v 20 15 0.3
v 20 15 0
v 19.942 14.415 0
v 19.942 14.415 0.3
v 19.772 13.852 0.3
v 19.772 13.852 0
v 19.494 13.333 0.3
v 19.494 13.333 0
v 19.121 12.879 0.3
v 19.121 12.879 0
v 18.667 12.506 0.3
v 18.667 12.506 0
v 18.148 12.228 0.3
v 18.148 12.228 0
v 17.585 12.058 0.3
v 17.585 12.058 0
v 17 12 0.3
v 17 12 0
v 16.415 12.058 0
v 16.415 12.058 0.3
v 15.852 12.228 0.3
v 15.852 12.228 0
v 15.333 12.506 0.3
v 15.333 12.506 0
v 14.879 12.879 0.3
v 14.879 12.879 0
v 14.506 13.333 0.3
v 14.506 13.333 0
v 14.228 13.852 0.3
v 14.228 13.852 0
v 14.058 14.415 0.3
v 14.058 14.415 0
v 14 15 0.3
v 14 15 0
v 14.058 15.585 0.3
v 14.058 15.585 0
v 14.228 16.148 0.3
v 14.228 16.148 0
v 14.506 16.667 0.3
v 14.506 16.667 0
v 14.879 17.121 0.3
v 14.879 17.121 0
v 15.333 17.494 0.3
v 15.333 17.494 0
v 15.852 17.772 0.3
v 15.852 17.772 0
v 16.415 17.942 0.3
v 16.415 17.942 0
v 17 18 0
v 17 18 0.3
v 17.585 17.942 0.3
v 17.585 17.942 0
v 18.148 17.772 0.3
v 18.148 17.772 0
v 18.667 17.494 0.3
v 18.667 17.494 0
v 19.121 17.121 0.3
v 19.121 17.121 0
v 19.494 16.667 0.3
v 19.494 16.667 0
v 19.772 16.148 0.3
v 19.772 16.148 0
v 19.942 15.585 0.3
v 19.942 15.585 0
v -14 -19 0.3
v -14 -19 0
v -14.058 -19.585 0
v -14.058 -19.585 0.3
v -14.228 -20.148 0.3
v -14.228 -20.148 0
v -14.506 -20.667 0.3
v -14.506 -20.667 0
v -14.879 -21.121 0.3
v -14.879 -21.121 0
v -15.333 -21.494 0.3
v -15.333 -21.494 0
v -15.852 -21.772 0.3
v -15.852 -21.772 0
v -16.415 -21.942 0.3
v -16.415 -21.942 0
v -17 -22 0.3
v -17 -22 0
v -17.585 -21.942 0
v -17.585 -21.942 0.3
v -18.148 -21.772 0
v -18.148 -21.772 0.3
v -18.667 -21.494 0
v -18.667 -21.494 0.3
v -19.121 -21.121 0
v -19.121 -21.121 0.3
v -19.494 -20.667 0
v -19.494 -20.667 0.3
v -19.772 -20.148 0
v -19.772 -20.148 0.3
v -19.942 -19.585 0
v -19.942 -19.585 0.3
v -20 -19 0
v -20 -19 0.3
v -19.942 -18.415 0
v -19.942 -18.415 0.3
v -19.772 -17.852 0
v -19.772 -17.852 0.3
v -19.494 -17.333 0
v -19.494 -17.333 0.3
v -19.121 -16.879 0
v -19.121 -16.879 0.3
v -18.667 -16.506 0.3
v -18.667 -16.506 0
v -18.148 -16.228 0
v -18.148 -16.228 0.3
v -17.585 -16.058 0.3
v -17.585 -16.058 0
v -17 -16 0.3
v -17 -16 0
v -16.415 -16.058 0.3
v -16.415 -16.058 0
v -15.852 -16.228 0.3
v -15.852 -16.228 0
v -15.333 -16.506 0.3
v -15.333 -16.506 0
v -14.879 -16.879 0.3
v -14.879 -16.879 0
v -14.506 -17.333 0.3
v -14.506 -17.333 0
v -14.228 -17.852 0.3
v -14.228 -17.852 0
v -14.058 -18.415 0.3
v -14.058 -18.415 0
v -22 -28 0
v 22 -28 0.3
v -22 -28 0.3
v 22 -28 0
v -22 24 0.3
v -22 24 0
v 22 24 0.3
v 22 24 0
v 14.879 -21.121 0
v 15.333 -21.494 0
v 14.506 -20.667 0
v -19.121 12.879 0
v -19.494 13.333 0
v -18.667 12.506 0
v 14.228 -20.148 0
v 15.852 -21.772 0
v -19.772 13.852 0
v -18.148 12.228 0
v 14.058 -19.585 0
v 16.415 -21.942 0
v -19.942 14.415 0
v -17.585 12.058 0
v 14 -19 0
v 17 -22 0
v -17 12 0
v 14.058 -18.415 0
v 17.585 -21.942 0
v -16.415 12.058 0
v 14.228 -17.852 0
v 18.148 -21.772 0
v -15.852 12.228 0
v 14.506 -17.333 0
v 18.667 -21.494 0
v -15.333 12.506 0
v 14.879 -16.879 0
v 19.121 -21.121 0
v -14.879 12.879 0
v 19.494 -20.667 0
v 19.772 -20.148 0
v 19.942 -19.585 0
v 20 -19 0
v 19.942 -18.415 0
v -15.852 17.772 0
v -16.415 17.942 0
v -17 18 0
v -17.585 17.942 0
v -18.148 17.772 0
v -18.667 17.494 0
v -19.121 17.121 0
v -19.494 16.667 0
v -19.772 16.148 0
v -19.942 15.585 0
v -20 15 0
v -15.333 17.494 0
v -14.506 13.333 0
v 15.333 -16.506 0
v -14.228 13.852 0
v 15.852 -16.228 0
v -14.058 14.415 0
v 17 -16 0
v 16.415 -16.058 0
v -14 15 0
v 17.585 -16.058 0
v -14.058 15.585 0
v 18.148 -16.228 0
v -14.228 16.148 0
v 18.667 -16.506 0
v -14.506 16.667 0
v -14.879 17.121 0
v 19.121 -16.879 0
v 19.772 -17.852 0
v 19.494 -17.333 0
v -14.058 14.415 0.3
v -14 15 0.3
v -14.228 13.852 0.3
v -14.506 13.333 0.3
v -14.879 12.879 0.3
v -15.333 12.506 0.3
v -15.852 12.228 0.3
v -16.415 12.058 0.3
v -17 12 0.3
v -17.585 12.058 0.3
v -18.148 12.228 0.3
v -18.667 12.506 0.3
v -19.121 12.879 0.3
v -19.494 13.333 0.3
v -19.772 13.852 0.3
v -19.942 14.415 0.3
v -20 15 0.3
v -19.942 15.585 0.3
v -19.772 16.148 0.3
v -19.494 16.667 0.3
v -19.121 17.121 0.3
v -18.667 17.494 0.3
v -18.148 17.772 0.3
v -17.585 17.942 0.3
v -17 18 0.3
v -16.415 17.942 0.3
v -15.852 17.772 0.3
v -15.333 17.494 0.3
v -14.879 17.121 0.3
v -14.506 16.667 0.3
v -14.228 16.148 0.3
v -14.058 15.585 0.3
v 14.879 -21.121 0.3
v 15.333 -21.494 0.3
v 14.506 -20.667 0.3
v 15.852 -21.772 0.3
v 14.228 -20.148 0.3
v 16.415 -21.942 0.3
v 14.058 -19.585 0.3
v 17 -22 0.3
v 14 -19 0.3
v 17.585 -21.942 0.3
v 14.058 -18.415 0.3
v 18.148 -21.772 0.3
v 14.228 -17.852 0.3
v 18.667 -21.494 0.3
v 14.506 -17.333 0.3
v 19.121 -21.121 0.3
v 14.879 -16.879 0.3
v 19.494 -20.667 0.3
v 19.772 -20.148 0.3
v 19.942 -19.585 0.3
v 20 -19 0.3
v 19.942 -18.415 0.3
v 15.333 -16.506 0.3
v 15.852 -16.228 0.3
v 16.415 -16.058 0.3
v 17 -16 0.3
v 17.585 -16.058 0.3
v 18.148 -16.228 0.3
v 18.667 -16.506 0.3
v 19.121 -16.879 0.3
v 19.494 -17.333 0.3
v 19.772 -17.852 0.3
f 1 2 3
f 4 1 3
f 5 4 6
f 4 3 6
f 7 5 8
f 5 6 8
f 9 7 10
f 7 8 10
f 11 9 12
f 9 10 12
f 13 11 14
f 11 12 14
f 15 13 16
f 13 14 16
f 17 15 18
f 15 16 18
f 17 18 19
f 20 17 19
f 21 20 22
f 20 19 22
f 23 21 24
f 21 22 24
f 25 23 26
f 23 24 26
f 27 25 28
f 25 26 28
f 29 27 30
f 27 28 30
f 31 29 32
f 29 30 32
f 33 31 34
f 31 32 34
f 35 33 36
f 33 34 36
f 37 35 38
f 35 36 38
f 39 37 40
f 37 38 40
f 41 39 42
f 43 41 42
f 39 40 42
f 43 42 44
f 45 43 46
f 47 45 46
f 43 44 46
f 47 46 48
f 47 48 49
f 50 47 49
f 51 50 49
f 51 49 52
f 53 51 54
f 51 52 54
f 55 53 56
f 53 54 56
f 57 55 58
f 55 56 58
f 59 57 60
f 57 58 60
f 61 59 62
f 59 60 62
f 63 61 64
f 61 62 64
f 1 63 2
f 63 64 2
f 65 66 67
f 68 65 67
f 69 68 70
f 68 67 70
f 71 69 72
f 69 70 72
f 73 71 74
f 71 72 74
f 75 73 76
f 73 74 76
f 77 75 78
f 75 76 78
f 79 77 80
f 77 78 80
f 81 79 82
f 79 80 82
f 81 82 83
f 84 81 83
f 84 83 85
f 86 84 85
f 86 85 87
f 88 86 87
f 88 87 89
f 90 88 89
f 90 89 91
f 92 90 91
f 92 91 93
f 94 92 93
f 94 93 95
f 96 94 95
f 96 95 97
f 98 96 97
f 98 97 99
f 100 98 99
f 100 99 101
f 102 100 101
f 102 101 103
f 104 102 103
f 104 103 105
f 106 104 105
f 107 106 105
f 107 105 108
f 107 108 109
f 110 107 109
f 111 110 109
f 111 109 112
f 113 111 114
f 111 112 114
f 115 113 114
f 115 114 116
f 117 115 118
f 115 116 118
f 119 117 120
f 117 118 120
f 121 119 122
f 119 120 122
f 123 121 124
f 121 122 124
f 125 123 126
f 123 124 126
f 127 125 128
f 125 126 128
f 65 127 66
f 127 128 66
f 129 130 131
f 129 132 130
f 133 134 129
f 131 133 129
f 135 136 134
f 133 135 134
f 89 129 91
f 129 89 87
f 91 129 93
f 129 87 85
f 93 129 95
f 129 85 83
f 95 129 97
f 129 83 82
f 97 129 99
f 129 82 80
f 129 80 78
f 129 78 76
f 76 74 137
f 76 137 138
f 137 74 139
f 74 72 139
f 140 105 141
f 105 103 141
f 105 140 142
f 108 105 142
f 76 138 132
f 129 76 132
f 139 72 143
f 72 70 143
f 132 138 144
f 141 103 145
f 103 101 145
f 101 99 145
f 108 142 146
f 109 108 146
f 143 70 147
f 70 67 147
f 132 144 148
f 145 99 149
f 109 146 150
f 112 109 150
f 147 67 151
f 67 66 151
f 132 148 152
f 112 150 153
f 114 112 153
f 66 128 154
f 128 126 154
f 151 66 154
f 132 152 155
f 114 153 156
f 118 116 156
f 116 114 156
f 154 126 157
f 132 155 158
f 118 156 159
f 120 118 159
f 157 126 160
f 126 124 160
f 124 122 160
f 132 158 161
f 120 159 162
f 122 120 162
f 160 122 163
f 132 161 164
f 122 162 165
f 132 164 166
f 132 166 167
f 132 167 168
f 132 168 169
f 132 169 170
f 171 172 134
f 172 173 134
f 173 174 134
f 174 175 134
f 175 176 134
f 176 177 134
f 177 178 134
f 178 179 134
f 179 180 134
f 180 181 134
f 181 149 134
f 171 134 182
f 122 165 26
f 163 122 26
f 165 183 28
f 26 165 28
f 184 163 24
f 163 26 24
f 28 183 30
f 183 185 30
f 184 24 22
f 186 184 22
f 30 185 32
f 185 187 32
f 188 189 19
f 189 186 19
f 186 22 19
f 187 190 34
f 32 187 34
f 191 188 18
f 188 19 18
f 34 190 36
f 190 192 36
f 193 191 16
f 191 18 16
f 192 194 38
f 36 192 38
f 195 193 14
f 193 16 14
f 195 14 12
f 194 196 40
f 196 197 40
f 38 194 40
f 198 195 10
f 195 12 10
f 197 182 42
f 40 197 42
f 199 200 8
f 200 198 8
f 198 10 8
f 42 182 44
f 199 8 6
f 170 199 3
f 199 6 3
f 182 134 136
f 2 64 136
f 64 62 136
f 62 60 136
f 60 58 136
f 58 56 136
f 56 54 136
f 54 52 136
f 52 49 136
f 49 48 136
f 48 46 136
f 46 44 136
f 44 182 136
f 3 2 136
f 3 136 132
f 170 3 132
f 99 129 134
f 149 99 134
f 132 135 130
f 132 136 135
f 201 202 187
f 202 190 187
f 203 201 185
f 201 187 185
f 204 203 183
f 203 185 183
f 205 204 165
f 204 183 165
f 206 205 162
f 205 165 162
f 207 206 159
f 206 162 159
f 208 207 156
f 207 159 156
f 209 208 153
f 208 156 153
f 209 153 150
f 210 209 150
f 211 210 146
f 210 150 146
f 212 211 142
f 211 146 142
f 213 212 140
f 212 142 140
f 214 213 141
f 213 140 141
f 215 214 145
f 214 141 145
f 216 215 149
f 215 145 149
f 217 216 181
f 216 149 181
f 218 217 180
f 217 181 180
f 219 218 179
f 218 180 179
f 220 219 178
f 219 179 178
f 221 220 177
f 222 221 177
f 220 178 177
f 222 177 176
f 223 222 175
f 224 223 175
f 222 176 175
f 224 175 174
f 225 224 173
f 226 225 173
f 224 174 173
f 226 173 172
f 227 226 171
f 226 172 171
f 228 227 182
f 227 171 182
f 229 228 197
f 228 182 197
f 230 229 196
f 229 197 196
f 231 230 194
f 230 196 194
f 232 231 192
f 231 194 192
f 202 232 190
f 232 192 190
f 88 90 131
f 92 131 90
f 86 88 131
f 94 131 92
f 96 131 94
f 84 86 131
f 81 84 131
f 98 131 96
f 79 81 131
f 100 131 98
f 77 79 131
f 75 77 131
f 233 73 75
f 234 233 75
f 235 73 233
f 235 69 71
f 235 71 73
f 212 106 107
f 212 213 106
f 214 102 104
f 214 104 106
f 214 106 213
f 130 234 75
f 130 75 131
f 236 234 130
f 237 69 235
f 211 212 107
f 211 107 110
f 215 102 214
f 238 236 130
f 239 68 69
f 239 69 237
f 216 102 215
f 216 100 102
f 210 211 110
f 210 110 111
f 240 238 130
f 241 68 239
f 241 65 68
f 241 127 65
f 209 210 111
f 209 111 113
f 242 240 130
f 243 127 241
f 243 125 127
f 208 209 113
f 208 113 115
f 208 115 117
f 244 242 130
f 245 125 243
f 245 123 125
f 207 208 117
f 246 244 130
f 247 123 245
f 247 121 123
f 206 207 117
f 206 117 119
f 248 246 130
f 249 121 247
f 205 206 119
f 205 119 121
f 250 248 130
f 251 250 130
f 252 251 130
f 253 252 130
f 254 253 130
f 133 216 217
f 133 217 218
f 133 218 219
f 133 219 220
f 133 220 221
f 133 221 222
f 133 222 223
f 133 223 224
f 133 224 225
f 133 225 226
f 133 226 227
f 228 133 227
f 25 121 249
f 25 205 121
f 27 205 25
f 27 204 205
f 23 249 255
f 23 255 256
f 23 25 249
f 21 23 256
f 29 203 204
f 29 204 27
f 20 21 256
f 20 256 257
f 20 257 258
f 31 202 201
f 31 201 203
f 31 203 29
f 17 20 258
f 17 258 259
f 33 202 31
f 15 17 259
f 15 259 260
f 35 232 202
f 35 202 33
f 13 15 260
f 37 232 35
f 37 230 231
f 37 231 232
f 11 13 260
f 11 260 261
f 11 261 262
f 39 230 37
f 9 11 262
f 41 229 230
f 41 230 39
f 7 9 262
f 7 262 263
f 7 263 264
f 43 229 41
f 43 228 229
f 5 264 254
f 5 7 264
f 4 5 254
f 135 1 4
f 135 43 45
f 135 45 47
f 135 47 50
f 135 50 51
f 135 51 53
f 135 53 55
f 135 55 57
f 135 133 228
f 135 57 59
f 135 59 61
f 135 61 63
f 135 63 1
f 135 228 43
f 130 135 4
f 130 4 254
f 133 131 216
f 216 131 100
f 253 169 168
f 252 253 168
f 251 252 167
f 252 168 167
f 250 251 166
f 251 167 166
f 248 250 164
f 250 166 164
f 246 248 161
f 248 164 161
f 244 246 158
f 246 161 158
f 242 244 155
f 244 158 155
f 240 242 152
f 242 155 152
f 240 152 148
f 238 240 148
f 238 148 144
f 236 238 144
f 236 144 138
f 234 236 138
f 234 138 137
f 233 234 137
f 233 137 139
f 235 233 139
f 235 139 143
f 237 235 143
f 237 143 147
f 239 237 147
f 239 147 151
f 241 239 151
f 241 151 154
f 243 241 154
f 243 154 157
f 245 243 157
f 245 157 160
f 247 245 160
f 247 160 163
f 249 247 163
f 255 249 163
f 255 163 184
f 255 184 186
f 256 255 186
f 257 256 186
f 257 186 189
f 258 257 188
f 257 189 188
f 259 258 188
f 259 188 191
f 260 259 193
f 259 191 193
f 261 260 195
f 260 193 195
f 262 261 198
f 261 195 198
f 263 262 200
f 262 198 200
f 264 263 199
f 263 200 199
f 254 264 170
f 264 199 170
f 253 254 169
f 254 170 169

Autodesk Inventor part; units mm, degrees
ref_plane "YZ Plane" through (0, 0, 0) normal (1, 0, 0) x (0, 1, 0)
ref_plane "XZ Plane" through (0, 0, 0) normal (0, 1, 0) x (-1, 0, 0)
ref_plane "XY Plane" through (0, 0, 0) normal (0, 0, 1) x (1, 0, 0)
sketch "スケッチ1" plane through (0, 0, 0) normal (0, 0, 1) x (1, 0, 0)
  line L0 (-22, -24) -> (22, -24)
  line L1 (22, -24) -> (22, 24)
  line L2 (22, 24) -> (-22, 24)
  line L3 (-22, 24) -> (-22, -24)
  line L4 (-22, -24) -> (22, 24) construction
  line L5 (22, -24) -> (-22, 24) construction
  line L6 (-17, 15) -> (17, 15)
  line L7 (17, 15) -> (17, -19)
  line L8 (17, -19) -> (-17, -19)
  line L9 (-17, -19) -> (-17, 15)
  circle A0 centre (-17, 15) radius 3
  circle A1 centre (17, 15) radius 3
  circle A2 centre (17, -19) radius 3
  circle A3 centre (-17, -19) radius 3
  circle A4 centre (-17, 15) radius 8
  circle A5 centre (17, 15) radius 8
  circle A6 centre (17, -19) radius 8
  circle A7 centre (-17, -19) radius 8
  line L10 (-22, -24) -> (22, -24)
  line L11 (22, -24) -> (22, -28)
  line L12 (22, -28) -> (-22, -28)
  line L13 (-22, -28) -> (-22, -24)
  line L14 (-2.5, 15) -> (2.5, 15)
  line L15 (2.5, 15) -> (2.5, -19)
  line L16 (2.5, -19) -> (-2.5, -19)
  line L17 (-2.5, -19) -> (-2.5, 15)
  line L18 (10.5, 15) -> (10.5, -19)
  line L19 (5.5, -19) -> (5.5, 15)
  line L20 (18.5, 15) -> (18.5, -19)
  line L21 (13.5, -19) -> (13.5, 15)
  line L22 (-5.5, 15) -> (-5.5, -19)
  line L23 (-10.5, -19) -> (-10.5, 15)
  line L24 (2.5, 15) -> (2.5, -19)
  line L25 (-2.5, -19) -> (-2.5, 15)
  line L26 (10.5, 15) -> (10.5, -19)
  line L27 (5.5, -19) -> (5.5, 15)
  line L28 (-13.5, 15) -> (-13.5, -19)
  line L29 (-18.5, -19) -> (-18.5, 15)
  line L30 (-5.5, 15) -> (-5.5, -19)
  line L31 (-10.5, -19) -> (-10.5, 15)
  line L32 (2.5, 15) -> (2.5, -19)
  line L33 (-2.5, -19) -> (-2.5, 15)
  point P0 (0, 0)
  point P1 (-9, 15)
  point P2 (9, 15)
  point P3 (17, 7)
  point P4 (17, -11)
  point P5 (9, -19)
  point P6 (-9, -19)
  point P7 (-17, -11)
  point P8 (-17, 7)
  point P9 (22, -24)
  point P10 (0, 15)
  point P11 (-18.5, 7.1419)
  point P12 (-18.5, -11.1419)
  point P13 (-13.5, -11.8063)
  point P14 (-13.5, 7.8063)
  point P15 (-10.5, 15)
  point P16 (-10.5, -19)
  point P17 (-5.5, -19)
  point P18 (-5.5, 15)
  point P19 (13.5, 7.8063)
  point P20 (13.5, -11.8063)
  point P21 (18.5, -11.1419)
  point P22 (18.5, 7.1419)
  point P23 (5.5, 15)
  point P24 (5.5, -19)
  point P25 (10.5, -19)
  point P26 (10.5, 15)
  point P27 (-2.5, -19)
  point P28 (2.5, 15)
  point P29 (-10.5, -14.3363)
  point P30 (-10.5, 10.3363)
  point P31 (10.5, 10.3363)
  point P32 (10.5, -14.3363)
  dimension "d0" = 48
  dimension "d1" = 44
  dimension "d2" = 34
  dimension "d3" = 5
  dimension "d4" = 5
  dimension "d5" = 6
  dimension "d6" = 16
  dimension "d11" = 4
  dimension "d12" = 5
  dimension "d15" = 8
  dimension "d18" = 8
extrude "プレート1" add sketch "スケッチ1" along normal blind 1.5 contours L3 A7 L29 A3 L8 L0 | L0 A7 L13 | A7 L8 A6 L0 | L0 A6 L11 L12 L13 A7 | L3 A4 L29 A7 | A6 L8 A2 L20 L1 L0 | L0 L11 A6 | L8 L23 A7 | L3 A4 L6 A0 L29 | A7 L9 A3 L29 | A6 L18 L8 | L22 L6 L17 L8 | L8 L28 A7 L23 | A7 L28 A4 L23 | L3 L2 L1 A5 L6 A4 | L29 A0 L9 A4 | A7 L28 L8 A3 L9 | A6 L20 A5 L1 | L18 A6 L21 L8 | L8 L15 L6 L19 | L18 A5 L21 A6 | L23 L6 A4 | A4 L28 L6 L23 | L9 A0 L6 L28 A4 | A5 L20 A1 L6 L1 | L20 A2 L7 A6 | L21 A6 L7 A2 L8 | L18 L6 L21 A5 | A5 L6 L18 | A5 L7 A1 L20 | L21 L6 A1 L7 A5
sketch "スケッチ2" plane through (0, 0, 1.5) normal (0, 0, 1) x (1, 0, 0)
  line L0 (11.5, -21.5) -> (11.5, -14.8) projected
  line L1 (11.5, -21.5) -> (12, -21.5) projected
  line L2 (12, -21.5) -> (12, -24) projected
  line L3 (18, -24) -> (14, -24) projected
  line L4 (18, -14) -> (18, -24) construction
  line L5 (12.3, -14) -> (18, -14) projected
  circle A0 centre (12.3, -14.8) radius 0.8
  circle A1 centre (14, -23.2) radius 0.8
  line L6 (0, 0) -> (0, -10)
  circle A2 centre (-12.3, -14.8) radius 0.8
  circle A3 centre (-14, -23.2) radius 0.8
  arc A4 (11.5, -14.8) -> (12.3, -14) centre (12.3, -14.8) ccw projected
  line L7 (14, -24) -> (12, -24) projected
  circle A5 centre (14, -23.2) radius 0.8 projected
  dimension "d21" = 1.6
  dimension "d22" = 1.6
  dimension "d25" = 2
extrude "切り取り1" cut sketch "スケッチ2" against normal blind 1.5
sketch "スケッチ3" plane through (0, 0, 1.5) normal (0, 0, 1) x (1, 0, 0)
  circle A0 centre (0, 19) radius 0.8
  circle A1 centre (-10, 19) radius 0.8
  circle A2 centre (10, 19) radius 0.8
  line L0 (-22, 24) -> (22, 24) projected
  point P0 (0, 0)
  point P1 (0, 24)
  dimension "d26" = 1.6
  dimension "d27" = 1.6
  dimension "d28" = 1.6
  dimension "d29" = 5
  dimension "d30" = 10
  dimension "d31" = 10
extrude "切り取り2" cut sketch "スケッチ3" against normal blind 1.5
sketch "スケッチ5" plane through (0, 0, 1.5) normal (0, 0, 1) x (1, 0, 0)
  line L0 (-32.0708, 30) -> (50, 30)
  line L1 (50, 30) -> (50, -40)
  line L2 (50, -40) -> (-32.0708, -40)
  line L3 (-32.0708, -40) -> (-32.0708, 30)
  point P0 (0, 0)
extrude "押し出し2" cut sketch "スケッチ5" against normal blind 1.2
sketch "スケッチ6" plane through (0, 0, 0.3) normal (0, 0, 1) x (1, 0, 0)
  circle A0 centre (-10, 19) radius 0.8 projected
  circle A1 centre (0, 19) radius 0.8 projected
  circle A2 centre (10, 19) radius 0.8 projected
  circle A3 centre (-12.3, -14.8) radius 0.8 projected
  circle A4 centre (12.3, -14.8) radius 0.8 projected
  circle A5 centre (14, -23.2) radius 0.8 projected
  circle A6 centre (-14, -23.2) radius 0.8 projected
  line L0 (13.5, 7.8063) -> (13.5, -11.8063) projected
  arc A7 (13.5, 7.8063) -> (18.5, 7.1419) centre (17, 15) ccw projected
  line L1 (18.5, -11.1419) -> (18.5, 7.1419) projected
  arc A8 (18.5, -11.1419) -> (13.5, -11.8063) centre (17, -19) ccw projected
  arc A9 (-13.5, -11.8063) -> (-18.5, -11.1419) centre (-17, -19) ccw projected
  line L2 (-18.5, 7.1419) -> (-18.5, -11.1419) projected
  arc A10 (-18.5, 7.1419) -> (-13.5, 7.8063) centre (-17, 15) ccw projected
  line L3 (-13.5, -11.8063) -> (-13.5, 7.8063) projected
  arc A11 (10.5, -14.3363) -> (9, -19) centre (17, -19) ccw projected
  line L4 (5.5, -19) -> (9, -19) projected
  line L5 (5.5, 15) -> (5.5, -19) projected
  line L6 (9, 15) -> (5.5, 15) projected
  arc A12 (9, 15) -> (10.5, 10.3363) centre (17, 15) ccw projected
  line L7 (10.5, -14.3363) -> (10.5, 10.3363) projected
  circle A13 centre (-17, 15) radius 3 projected
  circle A14 centre (-17, -19) radius 3 projected
  line L8 (-2.5, -19) -> (2.5, -19) projected
  line L9 (-2.5, 15) -> (-2.5, -19) projected
  line L10 (2.5, 15) -> (-2.5, 15) projected
  line L11 (2.5, -19) -> (2.5, 15) projected
  circle A15 centre (17, -19) radius 3 projected
  circle A16 centre (17, 15) radius 3 projected
  line L12 (-9, -19) -> (-5.5, -19) projected
  arc A17 (-9, -19) -> (-10.5, -14.3363) centre (-17, -19) ccw projected
  line L13 (-10.5, 10.3363) -> (-10.5, -14.3363) projected
  arc A18 (-10.5, 10.3363) -> (-9, 15) centre (-17, 15) ccw projected
  line L14 (-5.5, 15) -> (-9, 15) projected
  line L15 (-5.5, -19) -> (-5.5, 15) projected
  line L16 (-22, 24) -> (22, 24) projected
  line L17 (-22, -28) -> (-22, 24) projected
  line L18 (22, -28) -> (-22, -28) projected
  line L19 (22, 24) -> (22, -28) projected
  point P0 (0, 0)
extrude "押し出し3" add sketch "スケッチ6" against normal up to surface (0.3 mm away) contours A0 | A1 | A2 | A3 | A4 | A5 | A6 | A7 L1 A8 L0 | A9 L2 A10 L3 | A11 L4 L5 L6 A12 L7 | L9 L10 L11 L8 | A17 L13 A18 L14 L15 L12
equation "\"d4\" = d3"
equation "\"d23\" = Thickness"
equation "\"d32\" = Thickness"
equation "\"d10\" = Thickness"
equation "\"BendRadius\" = Thickness"
equation "\"BendReliefWidth\" = Thickness"
equation "\"BendReliefDepth\" = 0.5 * Thickness"
equation "\"CornerReliefSize\" = 4 * Thickness"
equation "\"MinimumRemnant\" = 2 * Thickness"
equation "\"TransitionRadius\" = BendRadius"
equation "\"JacobiRadiusSize\" = BendRadius"
equation "\"GapSize\" = Thickness"
equation "\"Thickness\" = 1.5"
properties part number "board_setter_safety"
